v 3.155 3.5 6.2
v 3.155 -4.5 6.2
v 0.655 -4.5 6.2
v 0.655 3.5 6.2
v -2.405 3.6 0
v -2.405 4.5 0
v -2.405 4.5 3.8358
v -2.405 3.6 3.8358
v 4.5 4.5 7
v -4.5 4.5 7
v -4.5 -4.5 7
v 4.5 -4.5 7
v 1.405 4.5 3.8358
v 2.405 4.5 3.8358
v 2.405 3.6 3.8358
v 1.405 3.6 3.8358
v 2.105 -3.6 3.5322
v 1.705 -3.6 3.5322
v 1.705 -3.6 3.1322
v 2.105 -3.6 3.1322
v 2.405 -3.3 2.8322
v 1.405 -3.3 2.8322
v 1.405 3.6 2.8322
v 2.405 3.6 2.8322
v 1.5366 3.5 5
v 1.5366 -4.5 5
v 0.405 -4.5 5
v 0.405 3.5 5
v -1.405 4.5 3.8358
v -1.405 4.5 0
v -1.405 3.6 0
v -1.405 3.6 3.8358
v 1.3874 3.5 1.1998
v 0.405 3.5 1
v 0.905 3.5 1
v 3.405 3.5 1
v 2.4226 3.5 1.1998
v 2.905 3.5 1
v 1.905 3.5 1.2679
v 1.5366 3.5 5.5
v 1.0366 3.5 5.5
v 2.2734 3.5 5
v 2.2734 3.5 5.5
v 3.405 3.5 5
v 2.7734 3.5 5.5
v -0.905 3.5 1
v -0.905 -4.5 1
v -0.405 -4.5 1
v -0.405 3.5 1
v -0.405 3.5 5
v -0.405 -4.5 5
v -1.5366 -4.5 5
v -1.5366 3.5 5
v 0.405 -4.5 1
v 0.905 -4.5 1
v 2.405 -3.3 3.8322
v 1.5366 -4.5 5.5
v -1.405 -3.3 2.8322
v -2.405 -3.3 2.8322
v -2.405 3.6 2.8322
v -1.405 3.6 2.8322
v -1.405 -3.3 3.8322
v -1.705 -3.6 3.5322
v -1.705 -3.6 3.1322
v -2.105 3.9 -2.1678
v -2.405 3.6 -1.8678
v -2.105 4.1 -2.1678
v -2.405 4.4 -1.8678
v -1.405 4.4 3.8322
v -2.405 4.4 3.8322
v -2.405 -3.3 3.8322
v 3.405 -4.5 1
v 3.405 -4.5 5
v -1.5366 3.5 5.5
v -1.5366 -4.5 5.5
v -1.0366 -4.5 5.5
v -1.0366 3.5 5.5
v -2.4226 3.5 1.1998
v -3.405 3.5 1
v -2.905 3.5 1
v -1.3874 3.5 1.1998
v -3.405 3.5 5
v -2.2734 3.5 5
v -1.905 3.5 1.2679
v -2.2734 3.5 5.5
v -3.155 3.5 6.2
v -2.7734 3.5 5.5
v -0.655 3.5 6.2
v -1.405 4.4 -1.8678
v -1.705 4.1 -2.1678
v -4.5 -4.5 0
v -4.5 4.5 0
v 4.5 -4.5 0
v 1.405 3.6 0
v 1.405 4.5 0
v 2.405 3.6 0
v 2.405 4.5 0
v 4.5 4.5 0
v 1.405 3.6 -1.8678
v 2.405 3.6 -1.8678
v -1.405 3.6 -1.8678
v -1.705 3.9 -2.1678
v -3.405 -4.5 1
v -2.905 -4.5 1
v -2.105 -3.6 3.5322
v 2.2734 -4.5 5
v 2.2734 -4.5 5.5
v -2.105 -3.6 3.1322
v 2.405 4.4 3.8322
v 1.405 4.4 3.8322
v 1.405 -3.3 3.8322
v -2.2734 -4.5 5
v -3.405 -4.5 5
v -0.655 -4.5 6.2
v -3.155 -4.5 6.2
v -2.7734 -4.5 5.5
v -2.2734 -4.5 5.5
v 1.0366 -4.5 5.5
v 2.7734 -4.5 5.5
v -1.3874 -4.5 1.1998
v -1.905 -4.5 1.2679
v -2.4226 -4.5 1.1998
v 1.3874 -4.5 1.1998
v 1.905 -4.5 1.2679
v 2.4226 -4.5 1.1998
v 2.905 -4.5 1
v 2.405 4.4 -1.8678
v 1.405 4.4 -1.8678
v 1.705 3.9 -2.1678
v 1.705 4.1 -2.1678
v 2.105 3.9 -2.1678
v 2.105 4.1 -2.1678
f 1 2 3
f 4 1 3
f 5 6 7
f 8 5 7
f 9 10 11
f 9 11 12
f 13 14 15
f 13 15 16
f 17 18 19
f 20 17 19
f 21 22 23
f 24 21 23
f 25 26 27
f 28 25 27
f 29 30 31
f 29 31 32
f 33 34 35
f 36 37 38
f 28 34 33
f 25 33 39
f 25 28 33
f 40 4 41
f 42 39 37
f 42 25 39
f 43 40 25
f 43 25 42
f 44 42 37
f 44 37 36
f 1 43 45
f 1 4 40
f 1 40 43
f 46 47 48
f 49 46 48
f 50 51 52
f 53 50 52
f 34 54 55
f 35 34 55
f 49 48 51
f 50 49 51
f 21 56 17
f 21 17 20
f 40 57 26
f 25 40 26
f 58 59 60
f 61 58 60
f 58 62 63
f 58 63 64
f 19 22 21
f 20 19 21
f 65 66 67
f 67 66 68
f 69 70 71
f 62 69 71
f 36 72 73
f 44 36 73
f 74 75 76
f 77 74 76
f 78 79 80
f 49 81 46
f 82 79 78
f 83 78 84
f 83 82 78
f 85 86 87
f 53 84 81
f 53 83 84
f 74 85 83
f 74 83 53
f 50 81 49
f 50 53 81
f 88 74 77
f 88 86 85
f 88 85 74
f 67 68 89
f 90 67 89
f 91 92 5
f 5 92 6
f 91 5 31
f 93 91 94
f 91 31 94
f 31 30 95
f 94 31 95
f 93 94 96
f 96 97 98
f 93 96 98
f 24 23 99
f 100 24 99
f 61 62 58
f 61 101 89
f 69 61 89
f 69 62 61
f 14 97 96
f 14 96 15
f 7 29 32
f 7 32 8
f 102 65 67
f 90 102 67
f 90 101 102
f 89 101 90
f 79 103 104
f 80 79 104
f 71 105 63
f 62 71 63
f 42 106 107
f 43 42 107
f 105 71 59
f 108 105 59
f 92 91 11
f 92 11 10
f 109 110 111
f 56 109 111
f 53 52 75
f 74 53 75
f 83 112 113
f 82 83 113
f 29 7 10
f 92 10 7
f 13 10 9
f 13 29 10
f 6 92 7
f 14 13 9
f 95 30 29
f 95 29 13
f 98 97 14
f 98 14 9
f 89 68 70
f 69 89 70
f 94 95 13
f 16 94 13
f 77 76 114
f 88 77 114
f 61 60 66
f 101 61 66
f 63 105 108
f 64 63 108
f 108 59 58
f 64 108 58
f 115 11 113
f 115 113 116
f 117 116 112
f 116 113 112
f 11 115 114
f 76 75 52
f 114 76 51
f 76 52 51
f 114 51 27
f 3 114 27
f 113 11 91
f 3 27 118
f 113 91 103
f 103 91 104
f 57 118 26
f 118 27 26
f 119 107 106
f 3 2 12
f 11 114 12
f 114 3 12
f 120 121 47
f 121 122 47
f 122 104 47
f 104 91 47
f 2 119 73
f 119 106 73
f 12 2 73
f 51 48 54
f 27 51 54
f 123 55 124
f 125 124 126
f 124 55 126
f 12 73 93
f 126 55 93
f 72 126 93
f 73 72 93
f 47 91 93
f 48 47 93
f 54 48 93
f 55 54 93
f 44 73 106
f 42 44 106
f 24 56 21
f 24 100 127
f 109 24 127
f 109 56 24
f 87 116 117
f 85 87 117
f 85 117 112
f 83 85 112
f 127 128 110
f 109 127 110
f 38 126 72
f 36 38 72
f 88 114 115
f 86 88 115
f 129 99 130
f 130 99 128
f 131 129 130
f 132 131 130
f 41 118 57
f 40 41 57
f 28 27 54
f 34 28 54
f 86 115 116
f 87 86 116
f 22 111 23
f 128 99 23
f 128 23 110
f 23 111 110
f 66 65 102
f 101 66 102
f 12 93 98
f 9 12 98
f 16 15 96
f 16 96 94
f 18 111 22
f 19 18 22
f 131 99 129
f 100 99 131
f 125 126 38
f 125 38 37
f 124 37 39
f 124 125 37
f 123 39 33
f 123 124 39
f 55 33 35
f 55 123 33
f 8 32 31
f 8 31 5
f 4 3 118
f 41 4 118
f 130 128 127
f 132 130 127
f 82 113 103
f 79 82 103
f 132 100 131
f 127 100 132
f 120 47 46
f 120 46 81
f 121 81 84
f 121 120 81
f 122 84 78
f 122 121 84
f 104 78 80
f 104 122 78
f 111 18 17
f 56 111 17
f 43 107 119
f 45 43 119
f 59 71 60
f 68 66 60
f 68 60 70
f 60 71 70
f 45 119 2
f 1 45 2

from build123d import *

# Parameters (mm, degrees)
F0_W       = 9
F0_H       = 9
F1_DEPTH   = 7
F3_DEPTH   = 8
F4_W       = 1
F4_H       = 3.8358249348
F5_DEPTH   = 0.9
F8_DEPTH   = 1
F10_DEPTH  = 1
F11_SIZE   = 0.3
F11_2_SIZE = 0.3
F13_DEPTH  = 8


# Not quite as in the source:
# - a feature names something its author has since deleted; it is built from what else it names


with BuildPart() as f1:
    # F0 (on Top) → F1 (new body)
    with BuildSketch(Plane.XY):
        Rectangle(F0_W, F0_H)
    extrude(amount=F1_DEPTH)

    # F2 (on face) → F3 (cut)
    with BuildSketch(Plane.XZ.offset(4.5)):
        Polygon((-3.405, 1), (-0.405, 1), (-0.405, 5), (-1.5365509928, 5), (-1.5365509928, 5.5), (-1.0365509928, 5.5), (-0.655, 6.2), (-3.155, 6.2), (-2.7734490072, 5.5), (-2.2734490072, 5.5), (-2.2734490072, 5), (-3.405, 5), align=None)
        Polygon((3.155, 6.2), (0.655, 6.2), (1.0365509928, 5.5), (1.5365509928, 5.5), (1.5365509928, 5), (0.405, 5), (0.405, 1), (3.405, 1), (3.405, 5), (2.2734490072, 5), (2.2734490072, 5.5), (2.7734490072, 5.5), align=None)
    extrude(amount=-F3_DEPTH, mode=Mode.SUBTRACT)

    # F4 (on face) → F5 (cut)
    with BuildSketch(Plane(origin=(0, 4.5, 0), x_dir=(-1, 0, 0), z_dir=(0, 1, 0))):
        with Locations((-1.905, 1.9179124674)):
            Rectangle(F4_W, F4_H)
        with Locations((1.905, 1.9179124674)):
            Rectangle(F4_W, F4_H)
    extrude(amount=-F5_DEPTH, mode=Mode.SUBTRACT)

    # F12 (on face) → F13 (join, through all)
    with BuildSketch(Plane.XZ.offset(4.5)):
        with BuildLine():
            Line((-2.905, 1), (-0.905, 1))
            ThreePointArc((-0.905, 1), (-1.905, 1.2679491924), (-2.905, 1))
        make_face()
        with BuildLine():
            ThreePointArc((2.905, 1), (1.905, 1.2679491924), (0.905, 1))
            Line((0.905, 1), (2.905, 1))
        make_face()
    extrude(amount=-F13_DEPTH)


with BuildPart() as f8:
    # F7 (on face) → F8 (new body)
    with BuildSketch(Plane.YZ.offset(-2.405)):
        Polygon((4.4, 3.8321887431), (-3.6, 3.8321887431), (-3.6, 2.8321887431), (3.6, 2.8321887431), (3.6, -2.1678112569), (4.4, -2.1678112569), align=None)
    extrude(amount=F8_DEPTH)

    # F11
    f11_edges = [f8.edges().sort_by_distance(p)[0] for p in [
        (-1.905, -3.6, 3.832189),
        (-1.905, -3.6, 2.832189),
        (-2.405, -3.6, 3.332189),
        (-1.405, -3.6, 3.332189),
        (-1.905, 3.6, -2.167811),
        (-1.905, 4.4, -2.167811),
        (-2.405, 4, -2.167811),
        (-1.405, 4, -2.167811),
    ]]
    chamfer(f11_edges, length=F11_SIZE)


with BuildPart() as f10:
    # F9 (on face) → F10 (new body)
    with BuildSketch(Plane.YZ.offset(1.405)):
        Polygon((3.6, -2.1678112569), (4.4, -2.1678112569), (4.4, 3.8321887431), (-3.6, 3.8321887431), (-3.6, 2.8321887431), (3.6, 2.8321887431), align=None)
    extrude(amount=F10_DEPTH)

    # F11#2
    f11_2_edges = [f10.edges().sort_by_distance(p)[0] for p in [
        (1.905, -3.6, 3.832189),
        (1.905, -3.6, 2.832189),
        (1.405, -3.6, 3.332189),
        (2.405, -3.6, 3.332189),
        (1.905, 3.6, -2.167811),
        (1.905, 4.4, -2.167811),
        (1.405, 4, -2.167811),
        (2.405, 4, -2.167811),
    ]]
    chamfer(f11_2_edges, length=F11_2_SIZE)


solid = Compound([f1.part, f8.part, f10.part])
